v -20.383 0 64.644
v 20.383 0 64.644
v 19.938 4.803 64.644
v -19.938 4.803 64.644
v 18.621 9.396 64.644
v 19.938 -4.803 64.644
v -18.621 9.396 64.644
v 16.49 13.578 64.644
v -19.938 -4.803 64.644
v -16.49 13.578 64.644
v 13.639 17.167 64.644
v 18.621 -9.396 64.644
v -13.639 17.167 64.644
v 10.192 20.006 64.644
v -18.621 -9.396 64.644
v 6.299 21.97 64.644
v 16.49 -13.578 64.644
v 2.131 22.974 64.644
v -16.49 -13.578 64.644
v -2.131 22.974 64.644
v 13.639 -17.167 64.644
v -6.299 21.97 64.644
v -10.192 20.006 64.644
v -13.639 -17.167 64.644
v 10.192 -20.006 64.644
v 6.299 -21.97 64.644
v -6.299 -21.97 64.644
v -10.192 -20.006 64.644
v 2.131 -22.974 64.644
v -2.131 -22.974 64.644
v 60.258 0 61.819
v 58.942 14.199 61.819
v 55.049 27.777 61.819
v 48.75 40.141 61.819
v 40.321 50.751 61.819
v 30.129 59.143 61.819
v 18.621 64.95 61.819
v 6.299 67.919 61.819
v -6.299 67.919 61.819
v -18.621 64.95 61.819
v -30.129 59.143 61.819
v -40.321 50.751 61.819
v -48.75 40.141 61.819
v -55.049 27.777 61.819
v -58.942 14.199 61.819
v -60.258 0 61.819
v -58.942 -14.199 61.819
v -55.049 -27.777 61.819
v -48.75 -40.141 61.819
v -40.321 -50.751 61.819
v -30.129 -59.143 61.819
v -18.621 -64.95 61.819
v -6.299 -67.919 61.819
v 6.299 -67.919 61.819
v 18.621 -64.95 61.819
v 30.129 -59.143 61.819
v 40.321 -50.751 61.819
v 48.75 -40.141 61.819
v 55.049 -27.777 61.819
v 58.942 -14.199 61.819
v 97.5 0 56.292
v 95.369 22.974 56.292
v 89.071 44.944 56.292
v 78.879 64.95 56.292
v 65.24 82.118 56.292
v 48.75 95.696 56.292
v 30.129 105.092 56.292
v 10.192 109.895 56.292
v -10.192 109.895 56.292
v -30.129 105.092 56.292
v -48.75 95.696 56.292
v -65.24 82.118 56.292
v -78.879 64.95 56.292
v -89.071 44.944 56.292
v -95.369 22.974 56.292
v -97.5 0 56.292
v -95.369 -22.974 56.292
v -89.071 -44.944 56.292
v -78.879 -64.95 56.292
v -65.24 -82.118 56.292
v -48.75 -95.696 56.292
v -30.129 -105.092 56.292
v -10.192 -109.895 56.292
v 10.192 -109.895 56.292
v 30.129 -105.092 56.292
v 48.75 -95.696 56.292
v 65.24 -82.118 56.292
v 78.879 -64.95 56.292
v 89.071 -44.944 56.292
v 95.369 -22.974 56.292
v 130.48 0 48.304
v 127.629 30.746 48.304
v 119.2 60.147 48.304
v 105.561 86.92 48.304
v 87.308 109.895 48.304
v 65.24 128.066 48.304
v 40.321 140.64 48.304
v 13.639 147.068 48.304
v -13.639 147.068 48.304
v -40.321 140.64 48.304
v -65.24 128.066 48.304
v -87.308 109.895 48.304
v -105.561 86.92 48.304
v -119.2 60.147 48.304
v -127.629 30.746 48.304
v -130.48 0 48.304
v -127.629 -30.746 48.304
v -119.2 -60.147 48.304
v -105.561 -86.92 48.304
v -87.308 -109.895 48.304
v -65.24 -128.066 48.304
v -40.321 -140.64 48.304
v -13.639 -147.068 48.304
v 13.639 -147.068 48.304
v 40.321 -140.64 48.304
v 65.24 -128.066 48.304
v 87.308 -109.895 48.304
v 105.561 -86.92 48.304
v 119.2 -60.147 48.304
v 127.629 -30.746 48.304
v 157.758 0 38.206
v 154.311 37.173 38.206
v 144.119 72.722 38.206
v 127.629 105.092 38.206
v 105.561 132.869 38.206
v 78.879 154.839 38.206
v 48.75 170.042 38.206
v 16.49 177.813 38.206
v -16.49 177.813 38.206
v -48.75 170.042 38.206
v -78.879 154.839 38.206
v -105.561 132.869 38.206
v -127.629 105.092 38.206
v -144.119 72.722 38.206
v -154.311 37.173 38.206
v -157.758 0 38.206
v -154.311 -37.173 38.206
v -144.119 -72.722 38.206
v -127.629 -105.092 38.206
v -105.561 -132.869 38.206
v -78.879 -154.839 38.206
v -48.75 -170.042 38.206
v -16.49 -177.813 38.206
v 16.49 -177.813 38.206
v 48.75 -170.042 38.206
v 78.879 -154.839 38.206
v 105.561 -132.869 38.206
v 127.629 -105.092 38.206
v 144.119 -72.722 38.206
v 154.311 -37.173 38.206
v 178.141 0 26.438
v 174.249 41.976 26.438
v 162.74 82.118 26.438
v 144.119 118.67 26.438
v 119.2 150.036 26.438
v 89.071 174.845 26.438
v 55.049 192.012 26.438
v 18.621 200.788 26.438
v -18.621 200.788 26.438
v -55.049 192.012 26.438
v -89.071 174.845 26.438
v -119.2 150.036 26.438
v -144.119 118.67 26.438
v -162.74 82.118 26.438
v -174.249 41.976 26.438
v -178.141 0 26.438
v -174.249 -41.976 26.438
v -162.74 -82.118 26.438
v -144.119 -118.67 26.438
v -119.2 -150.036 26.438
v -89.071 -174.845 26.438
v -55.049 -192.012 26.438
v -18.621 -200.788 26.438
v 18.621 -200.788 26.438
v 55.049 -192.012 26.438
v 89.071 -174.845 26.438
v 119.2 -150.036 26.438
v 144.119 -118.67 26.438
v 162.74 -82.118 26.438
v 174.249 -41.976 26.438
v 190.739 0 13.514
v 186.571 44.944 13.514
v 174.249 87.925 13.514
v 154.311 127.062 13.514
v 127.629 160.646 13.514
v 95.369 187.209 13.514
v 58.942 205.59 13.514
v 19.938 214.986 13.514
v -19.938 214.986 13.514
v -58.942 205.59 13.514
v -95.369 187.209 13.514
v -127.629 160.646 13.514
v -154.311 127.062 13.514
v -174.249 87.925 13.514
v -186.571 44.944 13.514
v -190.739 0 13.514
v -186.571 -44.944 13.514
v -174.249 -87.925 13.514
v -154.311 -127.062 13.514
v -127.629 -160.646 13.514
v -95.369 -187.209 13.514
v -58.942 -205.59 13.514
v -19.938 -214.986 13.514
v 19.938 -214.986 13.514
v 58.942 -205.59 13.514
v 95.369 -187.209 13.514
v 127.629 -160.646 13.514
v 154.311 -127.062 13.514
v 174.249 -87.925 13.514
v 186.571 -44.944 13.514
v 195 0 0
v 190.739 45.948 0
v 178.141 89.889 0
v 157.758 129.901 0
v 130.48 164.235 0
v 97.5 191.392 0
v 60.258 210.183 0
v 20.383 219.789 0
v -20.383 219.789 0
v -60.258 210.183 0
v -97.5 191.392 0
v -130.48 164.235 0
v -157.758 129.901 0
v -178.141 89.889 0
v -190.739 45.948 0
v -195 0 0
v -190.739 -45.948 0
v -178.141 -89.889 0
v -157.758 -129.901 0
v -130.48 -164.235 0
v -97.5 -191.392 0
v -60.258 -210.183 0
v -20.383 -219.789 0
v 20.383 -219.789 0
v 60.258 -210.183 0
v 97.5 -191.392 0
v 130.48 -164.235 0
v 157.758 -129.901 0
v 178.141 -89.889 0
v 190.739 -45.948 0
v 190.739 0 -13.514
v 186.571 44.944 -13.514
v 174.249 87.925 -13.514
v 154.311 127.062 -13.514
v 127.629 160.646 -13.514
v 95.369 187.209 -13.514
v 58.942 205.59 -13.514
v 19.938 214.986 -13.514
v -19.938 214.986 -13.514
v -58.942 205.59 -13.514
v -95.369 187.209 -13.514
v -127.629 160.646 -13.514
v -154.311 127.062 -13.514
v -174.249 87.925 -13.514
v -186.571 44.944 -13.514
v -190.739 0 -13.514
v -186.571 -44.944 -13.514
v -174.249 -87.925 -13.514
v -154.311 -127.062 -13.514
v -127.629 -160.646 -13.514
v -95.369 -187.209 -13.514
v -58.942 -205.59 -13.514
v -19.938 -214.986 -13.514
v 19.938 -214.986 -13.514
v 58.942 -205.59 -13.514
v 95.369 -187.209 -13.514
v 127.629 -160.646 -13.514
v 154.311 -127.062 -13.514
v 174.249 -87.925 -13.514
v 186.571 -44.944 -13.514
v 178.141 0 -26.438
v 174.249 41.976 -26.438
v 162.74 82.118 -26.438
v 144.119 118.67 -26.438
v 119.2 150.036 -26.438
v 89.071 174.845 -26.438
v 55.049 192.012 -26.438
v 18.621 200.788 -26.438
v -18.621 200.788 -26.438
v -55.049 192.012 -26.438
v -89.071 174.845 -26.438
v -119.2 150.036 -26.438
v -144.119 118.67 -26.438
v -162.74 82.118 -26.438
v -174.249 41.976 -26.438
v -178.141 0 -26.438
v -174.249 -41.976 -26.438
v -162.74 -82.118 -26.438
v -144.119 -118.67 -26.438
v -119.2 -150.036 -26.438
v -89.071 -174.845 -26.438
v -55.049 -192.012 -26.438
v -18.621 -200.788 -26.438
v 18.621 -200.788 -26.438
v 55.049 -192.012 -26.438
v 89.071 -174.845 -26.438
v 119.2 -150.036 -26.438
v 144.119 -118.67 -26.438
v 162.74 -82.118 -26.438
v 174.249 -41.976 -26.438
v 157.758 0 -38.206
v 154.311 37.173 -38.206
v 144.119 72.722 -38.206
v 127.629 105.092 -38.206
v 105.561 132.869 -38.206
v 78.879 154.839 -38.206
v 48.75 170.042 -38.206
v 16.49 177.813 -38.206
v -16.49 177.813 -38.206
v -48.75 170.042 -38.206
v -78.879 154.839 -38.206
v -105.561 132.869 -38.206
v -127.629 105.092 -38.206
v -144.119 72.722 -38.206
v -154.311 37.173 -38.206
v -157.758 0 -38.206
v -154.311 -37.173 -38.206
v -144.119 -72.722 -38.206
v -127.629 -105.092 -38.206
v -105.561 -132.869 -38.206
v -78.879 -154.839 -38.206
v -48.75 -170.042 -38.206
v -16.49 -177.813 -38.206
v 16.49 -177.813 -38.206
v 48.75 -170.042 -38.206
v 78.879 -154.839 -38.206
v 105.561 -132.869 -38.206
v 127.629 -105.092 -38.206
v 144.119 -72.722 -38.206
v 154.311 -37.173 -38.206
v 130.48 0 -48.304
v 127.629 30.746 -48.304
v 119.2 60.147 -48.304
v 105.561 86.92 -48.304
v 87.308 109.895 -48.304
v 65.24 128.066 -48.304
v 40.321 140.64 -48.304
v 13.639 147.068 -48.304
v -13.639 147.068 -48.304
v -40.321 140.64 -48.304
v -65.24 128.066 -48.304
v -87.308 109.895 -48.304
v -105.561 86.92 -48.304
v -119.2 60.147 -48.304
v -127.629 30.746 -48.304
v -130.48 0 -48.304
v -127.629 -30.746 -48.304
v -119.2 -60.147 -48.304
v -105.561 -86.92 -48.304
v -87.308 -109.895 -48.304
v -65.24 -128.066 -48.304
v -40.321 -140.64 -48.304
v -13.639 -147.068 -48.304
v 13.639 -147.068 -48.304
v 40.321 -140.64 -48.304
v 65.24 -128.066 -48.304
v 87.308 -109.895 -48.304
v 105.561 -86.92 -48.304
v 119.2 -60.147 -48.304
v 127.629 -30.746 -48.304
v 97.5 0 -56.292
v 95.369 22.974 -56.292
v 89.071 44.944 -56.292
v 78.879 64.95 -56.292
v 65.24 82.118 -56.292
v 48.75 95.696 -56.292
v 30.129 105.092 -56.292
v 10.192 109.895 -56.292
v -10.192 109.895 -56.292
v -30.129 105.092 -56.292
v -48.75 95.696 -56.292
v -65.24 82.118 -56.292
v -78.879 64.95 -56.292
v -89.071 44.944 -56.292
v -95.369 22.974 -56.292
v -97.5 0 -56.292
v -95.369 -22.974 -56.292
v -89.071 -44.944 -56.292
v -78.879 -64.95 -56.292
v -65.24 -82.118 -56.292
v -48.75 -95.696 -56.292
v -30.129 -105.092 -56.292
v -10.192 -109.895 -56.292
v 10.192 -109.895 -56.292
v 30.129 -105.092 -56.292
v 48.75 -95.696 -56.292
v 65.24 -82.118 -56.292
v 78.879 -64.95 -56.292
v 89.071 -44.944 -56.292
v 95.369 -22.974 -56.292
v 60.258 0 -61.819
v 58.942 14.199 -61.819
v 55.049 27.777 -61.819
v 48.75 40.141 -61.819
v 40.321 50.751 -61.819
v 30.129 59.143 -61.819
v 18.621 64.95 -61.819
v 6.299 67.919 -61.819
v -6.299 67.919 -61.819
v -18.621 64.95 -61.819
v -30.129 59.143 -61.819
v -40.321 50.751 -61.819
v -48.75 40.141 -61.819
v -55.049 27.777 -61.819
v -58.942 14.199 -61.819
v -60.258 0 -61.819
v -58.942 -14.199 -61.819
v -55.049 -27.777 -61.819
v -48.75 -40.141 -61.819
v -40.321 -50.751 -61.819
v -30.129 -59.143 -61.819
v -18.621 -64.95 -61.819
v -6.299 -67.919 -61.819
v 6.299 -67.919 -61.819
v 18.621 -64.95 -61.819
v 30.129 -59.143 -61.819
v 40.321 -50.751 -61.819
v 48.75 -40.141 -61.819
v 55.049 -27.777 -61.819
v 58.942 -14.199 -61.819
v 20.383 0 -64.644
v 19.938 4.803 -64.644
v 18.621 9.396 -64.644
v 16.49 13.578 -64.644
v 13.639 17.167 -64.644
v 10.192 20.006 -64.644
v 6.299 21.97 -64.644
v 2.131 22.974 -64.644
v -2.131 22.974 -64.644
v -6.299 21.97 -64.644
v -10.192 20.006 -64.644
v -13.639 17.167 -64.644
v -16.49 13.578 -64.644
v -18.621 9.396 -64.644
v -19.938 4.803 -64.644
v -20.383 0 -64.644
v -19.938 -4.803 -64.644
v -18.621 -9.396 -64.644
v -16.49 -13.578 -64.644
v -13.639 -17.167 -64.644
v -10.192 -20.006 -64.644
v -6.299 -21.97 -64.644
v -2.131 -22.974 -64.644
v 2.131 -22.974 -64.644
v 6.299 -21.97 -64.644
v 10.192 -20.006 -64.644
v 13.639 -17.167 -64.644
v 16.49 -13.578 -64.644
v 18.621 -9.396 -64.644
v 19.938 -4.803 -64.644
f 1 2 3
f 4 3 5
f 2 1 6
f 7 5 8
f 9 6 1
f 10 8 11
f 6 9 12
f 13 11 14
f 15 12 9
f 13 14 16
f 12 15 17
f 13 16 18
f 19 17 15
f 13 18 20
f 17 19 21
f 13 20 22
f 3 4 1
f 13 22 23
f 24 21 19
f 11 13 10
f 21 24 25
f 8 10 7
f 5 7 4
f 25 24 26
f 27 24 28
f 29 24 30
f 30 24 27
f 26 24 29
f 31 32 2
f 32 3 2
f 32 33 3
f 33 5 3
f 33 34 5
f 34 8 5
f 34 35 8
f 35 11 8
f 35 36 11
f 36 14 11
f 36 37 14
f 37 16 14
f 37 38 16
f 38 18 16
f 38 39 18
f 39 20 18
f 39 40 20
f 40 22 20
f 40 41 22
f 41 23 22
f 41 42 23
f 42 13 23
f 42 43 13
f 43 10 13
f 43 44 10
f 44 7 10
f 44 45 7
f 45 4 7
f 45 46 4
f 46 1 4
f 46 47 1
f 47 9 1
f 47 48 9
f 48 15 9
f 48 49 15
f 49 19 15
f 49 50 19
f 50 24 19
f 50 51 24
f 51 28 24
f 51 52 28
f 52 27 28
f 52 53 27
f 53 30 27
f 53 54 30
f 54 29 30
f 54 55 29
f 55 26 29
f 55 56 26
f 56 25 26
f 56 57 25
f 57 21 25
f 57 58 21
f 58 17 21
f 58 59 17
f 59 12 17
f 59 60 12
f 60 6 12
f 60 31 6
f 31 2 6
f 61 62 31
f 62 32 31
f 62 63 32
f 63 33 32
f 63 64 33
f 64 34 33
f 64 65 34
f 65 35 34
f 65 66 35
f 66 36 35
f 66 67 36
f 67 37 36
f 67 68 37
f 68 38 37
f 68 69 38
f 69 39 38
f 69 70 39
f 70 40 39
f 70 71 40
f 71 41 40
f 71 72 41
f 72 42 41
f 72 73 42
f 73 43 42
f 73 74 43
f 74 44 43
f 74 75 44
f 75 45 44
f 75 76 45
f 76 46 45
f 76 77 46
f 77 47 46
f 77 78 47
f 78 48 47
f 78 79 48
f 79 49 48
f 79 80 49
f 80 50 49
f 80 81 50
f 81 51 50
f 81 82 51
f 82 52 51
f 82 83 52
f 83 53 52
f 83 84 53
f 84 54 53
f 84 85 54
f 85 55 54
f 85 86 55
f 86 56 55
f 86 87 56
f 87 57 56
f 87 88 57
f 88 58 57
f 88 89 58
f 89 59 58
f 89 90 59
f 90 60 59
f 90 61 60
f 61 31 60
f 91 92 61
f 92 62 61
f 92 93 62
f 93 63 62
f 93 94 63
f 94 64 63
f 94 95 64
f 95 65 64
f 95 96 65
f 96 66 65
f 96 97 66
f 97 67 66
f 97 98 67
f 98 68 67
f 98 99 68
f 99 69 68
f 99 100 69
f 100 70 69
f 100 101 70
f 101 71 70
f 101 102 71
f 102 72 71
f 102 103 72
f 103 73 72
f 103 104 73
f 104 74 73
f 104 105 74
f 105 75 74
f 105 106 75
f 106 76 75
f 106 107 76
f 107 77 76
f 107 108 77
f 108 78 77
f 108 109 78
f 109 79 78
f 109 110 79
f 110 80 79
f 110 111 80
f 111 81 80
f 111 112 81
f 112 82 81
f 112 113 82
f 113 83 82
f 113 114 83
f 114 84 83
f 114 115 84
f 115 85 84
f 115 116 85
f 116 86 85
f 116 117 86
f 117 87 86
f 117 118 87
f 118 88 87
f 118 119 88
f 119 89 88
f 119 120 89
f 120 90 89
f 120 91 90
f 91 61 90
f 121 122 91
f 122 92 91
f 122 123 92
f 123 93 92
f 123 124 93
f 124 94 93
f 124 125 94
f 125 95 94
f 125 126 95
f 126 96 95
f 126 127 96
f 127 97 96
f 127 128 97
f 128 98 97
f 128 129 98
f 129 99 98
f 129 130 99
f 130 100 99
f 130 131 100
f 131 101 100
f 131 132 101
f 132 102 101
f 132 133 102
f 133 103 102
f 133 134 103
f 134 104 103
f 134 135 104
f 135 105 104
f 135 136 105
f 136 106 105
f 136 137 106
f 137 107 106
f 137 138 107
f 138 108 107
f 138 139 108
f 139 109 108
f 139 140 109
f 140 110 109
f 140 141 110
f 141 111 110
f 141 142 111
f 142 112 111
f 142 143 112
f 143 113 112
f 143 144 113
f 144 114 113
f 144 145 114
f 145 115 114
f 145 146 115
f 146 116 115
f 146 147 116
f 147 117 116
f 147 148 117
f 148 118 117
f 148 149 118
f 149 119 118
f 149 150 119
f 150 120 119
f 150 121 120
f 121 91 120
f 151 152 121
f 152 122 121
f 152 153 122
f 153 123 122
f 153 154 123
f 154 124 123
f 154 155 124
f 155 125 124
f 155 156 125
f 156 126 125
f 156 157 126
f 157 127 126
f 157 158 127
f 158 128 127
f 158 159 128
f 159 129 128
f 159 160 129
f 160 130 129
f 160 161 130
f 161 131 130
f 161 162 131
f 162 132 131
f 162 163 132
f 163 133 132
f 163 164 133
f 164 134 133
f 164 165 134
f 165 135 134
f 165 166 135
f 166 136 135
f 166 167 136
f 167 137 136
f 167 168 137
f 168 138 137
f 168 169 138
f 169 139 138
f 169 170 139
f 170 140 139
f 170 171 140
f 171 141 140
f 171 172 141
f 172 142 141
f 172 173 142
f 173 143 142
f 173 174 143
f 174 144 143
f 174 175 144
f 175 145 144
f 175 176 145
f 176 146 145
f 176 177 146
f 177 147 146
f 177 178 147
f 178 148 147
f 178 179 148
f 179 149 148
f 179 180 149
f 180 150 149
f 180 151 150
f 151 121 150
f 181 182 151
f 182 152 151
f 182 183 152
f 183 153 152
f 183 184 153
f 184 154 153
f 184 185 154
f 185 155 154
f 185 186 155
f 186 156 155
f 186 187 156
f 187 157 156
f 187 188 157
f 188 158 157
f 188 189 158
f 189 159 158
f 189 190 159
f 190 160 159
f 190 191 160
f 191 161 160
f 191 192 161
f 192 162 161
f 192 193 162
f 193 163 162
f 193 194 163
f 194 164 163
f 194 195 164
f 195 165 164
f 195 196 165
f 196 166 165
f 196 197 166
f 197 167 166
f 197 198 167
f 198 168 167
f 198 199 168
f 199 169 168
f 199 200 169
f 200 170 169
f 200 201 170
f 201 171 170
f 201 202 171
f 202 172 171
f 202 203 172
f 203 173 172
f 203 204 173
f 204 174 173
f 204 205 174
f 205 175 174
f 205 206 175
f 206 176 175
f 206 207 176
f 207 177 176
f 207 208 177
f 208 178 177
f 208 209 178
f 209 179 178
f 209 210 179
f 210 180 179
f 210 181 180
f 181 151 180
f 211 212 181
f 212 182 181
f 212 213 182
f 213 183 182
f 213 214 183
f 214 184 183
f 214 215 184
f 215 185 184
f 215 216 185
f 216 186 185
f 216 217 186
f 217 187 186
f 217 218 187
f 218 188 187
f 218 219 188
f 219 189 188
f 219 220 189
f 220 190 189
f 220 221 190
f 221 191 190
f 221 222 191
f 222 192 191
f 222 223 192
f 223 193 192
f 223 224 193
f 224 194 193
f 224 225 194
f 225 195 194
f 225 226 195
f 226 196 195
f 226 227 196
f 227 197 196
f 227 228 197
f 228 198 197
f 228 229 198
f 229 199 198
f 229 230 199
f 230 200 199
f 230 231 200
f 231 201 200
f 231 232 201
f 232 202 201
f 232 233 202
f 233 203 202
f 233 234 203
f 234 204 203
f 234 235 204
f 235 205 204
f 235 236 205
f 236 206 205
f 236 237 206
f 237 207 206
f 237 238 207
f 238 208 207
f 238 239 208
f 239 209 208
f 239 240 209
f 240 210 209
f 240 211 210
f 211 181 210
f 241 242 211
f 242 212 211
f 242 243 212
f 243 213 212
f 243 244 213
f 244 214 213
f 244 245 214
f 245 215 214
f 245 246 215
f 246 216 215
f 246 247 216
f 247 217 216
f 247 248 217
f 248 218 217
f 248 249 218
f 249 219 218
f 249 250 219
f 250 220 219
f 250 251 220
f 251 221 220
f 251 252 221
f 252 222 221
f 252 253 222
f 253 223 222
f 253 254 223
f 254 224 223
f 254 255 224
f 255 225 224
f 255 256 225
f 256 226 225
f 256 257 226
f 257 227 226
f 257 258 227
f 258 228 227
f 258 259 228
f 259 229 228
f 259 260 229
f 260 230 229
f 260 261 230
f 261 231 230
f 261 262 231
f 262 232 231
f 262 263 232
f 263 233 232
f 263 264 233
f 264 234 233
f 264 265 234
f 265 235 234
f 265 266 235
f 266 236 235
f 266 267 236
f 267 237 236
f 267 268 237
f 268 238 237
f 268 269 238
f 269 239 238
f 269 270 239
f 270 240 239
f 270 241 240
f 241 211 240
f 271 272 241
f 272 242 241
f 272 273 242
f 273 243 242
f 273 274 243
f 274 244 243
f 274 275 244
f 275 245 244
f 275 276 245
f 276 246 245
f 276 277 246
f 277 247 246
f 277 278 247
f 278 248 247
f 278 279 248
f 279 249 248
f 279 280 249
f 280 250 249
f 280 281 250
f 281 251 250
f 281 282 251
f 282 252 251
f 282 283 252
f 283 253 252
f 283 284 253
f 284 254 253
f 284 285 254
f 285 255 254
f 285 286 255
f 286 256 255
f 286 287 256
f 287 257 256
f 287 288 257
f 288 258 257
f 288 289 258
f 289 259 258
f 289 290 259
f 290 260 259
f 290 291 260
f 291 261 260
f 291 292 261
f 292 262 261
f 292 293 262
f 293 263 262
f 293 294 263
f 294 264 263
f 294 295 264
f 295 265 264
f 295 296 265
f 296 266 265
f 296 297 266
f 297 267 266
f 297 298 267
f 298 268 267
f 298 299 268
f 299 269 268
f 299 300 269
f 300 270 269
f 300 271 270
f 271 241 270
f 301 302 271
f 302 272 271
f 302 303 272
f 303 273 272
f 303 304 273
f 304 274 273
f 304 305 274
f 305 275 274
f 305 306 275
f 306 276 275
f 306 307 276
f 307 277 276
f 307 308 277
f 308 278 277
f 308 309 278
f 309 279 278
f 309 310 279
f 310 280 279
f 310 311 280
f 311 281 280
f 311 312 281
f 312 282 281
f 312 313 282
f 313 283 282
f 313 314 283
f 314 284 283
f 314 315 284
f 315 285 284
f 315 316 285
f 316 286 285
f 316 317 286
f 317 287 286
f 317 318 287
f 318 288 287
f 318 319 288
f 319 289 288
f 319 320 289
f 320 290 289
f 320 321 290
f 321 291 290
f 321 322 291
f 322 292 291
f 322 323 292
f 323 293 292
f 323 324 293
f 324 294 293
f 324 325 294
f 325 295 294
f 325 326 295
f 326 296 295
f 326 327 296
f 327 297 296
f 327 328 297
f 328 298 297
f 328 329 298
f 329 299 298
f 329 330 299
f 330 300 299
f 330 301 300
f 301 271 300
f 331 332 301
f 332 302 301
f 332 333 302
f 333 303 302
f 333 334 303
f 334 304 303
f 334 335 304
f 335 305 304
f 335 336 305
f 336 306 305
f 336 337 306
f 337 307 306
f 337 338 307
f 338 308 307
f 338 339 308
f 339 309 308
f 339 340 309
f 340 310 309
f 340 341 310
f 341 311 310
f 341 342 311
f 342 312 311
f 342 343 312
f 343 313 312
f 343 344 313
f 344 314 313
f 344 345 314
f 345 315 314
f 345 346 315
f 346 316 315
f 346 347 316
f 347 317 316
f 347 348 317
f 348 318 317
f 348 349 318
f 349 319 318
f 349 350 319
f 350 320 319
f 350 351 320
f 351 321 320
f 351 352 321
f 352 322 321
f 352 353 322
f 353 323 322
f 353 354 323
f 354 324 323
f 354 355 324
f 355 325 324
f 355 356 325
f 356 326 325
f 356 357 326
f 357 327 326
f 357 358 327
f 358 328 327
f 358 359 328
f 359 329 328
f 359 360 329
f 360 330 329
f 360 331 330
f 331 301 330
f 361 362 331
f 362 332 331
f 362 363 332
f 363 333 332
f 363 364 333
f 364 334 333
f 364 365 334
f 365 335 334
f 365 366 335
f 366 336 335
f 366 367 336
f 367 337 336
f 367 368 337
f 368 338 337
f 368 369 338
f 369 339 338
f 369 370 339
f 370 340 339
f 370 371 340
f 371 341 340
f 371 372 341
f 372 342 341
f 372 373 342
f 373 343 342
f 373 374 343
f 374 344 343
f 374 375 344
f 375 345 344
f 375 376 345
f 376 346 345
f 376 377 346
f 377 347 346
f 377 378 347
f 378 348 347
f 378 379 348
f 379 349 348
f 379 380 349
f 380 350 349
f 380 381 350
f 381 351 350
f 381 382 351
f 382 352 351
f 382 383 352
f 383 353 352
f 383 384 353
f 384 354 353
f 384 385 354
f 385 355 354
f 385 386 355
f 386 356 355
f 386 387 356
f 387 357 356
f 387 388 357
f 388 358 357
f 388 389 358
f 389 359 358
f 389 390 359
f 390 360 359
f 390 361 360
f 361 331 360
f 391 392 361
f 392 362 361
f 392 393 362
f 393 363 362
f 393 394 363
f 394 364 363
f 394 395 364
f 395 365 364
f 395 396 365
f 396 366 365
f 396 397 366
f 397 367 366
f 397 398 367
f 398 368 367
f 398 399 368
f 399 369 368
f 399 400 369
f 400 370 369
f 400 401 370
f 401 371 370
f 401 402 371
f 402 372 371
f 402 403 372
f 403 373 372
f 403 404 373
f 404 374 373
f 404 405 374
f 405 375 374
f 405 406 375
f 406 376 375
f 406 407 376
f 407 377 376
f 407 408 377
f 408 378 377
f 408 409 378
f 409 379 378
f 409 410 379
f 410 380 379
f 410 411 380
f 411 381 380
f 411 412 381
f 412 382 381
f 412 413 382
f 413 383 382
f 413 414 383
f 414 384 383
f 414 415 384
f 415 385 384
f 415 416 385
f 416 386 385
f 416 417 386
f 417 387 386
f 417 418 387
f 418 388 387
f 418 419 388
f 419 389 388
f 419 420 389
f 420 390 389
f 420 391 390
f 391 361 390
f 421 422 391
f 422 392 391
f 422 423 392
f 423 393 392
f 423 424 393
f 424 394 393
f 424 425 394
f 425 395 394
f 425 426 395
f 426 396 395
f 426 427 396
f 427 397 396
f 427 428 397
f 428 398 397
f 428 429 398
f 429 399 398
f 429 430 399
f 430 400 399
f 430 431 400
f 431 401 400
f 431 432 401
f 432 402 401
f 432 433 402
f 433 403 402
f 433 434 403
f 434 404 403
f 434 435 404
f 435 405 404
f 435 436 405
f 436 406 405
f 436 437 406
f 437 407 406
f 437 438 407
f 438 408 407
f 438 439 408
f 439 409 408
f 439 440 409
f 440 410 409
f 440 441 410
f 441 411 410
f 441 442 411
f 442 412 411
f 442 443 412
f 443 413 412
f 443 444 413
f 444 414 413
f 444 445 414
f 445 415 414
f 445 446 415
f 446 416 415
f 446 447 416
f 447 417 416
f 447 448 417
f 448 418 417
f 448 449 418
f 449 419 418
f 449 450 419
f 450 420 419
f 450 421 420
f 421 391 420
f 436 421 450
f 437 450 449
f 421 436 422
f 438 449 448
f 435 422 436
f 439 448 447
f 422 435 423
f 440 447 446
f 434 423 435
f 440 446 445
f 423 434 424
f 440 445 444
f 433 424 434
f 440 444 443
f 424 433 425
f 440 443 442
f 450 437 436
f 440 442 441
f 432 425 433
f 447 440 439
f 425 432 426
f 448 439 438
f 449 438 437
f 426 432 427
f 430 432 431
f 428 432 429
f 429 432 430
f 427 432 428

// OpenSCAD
// Generated by SolidPython 1.0.1 on 2020-07-29 00:46:52


scale(v = [15, 17, 5]) {
	sphere(r = 13);
}
/***********************************************
*********      SolidPython code:      **********
************************************************
 
# import packages: SolidPython
from solid import *
from solid.utils import *
from itertools import chain, combinations, permutations


class Resize:

    def __init__(self, scad_file):
        self.scad_file = scad_file
        #self.scad_file = import_scad(scad_file)
        # cone/cylinder param:
        self.r1 = 0
        self.r2 = 0
        self.h = 0
        # rectangular prism param:
        self.w = 0
        self.l = 0
        # ellipse param:
        self.r = 0

    # import OpenScad code (file name corresponds to shape)


    # classify shape + parameters
    def assign(self, param1, param2, param3):
        if self.scad_file == 'cone.scad':
            self.r1 = param1
            self.r2 = param2
            self.h = param3
        elif self.scad_file == 'cylinder.scad':
            self.r1 = param1
            self.r2 = param2
            self.h = param3
        elif self.scad_file == 'rectangularPrism.scad':
            self.h = param1
            self.l = param2
            self.w = param3
        else:
            self.r = param1
            self.h = param2

    # resize parameters
    def iterate(self):
        x = range(3, 20, 2)
        i = 1
        if self.scad_file == 'cone.scad':
            tempList = list(permutations(x, 2))
            for temp in tempList:
                param1 = temp[0]
                param2 = temp[1]
                filepath = 'produced_scad_files/' + 'cone' + str(param1) + '_' + str(param2) + '_' + '.scad'
                scad_render_to_file(cylinder(h=param1, r1=param2, r2=0), filepath)

        elif self.scad_file == 'cylinder.scad':
            tempList = list(permutations(x, 3))
            for temp in tempList:
                param1 = temp[0]
                param2 = temp[1]
                filepath = 'produced_scad_files/' + 'cylinder' + str(param1) + '_' + str(param2) + '_' + '.scad'
                scad_render_to_file(cylinder(h=param1, r1=param2, r2=param2), filepath)

        elif self.scad_file == 'rectangularPrism.scad':
            tempList = list(permutations(x, 3))
            for temp in tempList:
                param1 = temp[0]
                param2 = temp[1]
                param3 = temp[2]
                filepath = 'produced_scad_files/' + 'rectangularPrism' + str(param1) + '_' + str(param2) + '_' + str(
                    param3) + '.scad'
                scad_render_to_file(cube(size=(param1, param2, param3)), filepath)

        elif self.scad_file == 'ellipse.scad':
            tempList = list(permutations(x, 4))
            for temp in tempList:
                param1 = temp[0]
                param2 = temp[1]
                param3 = temp[2]
                param4 = temp[3]
                filepath = 'produced_scad_files/' + 'ellipse' + str(param1) + '_' + str(param2) + '_' + str(param3) + '_' + str(param4) + '.scad'
                scad_render_to_file(scale([param1, param2, param3])(sphere(r=param4)), filepath)

    def render_to_scadfile(self):
        scad_render_to_file(scad, 'example.scad') 
 
************************************************/
